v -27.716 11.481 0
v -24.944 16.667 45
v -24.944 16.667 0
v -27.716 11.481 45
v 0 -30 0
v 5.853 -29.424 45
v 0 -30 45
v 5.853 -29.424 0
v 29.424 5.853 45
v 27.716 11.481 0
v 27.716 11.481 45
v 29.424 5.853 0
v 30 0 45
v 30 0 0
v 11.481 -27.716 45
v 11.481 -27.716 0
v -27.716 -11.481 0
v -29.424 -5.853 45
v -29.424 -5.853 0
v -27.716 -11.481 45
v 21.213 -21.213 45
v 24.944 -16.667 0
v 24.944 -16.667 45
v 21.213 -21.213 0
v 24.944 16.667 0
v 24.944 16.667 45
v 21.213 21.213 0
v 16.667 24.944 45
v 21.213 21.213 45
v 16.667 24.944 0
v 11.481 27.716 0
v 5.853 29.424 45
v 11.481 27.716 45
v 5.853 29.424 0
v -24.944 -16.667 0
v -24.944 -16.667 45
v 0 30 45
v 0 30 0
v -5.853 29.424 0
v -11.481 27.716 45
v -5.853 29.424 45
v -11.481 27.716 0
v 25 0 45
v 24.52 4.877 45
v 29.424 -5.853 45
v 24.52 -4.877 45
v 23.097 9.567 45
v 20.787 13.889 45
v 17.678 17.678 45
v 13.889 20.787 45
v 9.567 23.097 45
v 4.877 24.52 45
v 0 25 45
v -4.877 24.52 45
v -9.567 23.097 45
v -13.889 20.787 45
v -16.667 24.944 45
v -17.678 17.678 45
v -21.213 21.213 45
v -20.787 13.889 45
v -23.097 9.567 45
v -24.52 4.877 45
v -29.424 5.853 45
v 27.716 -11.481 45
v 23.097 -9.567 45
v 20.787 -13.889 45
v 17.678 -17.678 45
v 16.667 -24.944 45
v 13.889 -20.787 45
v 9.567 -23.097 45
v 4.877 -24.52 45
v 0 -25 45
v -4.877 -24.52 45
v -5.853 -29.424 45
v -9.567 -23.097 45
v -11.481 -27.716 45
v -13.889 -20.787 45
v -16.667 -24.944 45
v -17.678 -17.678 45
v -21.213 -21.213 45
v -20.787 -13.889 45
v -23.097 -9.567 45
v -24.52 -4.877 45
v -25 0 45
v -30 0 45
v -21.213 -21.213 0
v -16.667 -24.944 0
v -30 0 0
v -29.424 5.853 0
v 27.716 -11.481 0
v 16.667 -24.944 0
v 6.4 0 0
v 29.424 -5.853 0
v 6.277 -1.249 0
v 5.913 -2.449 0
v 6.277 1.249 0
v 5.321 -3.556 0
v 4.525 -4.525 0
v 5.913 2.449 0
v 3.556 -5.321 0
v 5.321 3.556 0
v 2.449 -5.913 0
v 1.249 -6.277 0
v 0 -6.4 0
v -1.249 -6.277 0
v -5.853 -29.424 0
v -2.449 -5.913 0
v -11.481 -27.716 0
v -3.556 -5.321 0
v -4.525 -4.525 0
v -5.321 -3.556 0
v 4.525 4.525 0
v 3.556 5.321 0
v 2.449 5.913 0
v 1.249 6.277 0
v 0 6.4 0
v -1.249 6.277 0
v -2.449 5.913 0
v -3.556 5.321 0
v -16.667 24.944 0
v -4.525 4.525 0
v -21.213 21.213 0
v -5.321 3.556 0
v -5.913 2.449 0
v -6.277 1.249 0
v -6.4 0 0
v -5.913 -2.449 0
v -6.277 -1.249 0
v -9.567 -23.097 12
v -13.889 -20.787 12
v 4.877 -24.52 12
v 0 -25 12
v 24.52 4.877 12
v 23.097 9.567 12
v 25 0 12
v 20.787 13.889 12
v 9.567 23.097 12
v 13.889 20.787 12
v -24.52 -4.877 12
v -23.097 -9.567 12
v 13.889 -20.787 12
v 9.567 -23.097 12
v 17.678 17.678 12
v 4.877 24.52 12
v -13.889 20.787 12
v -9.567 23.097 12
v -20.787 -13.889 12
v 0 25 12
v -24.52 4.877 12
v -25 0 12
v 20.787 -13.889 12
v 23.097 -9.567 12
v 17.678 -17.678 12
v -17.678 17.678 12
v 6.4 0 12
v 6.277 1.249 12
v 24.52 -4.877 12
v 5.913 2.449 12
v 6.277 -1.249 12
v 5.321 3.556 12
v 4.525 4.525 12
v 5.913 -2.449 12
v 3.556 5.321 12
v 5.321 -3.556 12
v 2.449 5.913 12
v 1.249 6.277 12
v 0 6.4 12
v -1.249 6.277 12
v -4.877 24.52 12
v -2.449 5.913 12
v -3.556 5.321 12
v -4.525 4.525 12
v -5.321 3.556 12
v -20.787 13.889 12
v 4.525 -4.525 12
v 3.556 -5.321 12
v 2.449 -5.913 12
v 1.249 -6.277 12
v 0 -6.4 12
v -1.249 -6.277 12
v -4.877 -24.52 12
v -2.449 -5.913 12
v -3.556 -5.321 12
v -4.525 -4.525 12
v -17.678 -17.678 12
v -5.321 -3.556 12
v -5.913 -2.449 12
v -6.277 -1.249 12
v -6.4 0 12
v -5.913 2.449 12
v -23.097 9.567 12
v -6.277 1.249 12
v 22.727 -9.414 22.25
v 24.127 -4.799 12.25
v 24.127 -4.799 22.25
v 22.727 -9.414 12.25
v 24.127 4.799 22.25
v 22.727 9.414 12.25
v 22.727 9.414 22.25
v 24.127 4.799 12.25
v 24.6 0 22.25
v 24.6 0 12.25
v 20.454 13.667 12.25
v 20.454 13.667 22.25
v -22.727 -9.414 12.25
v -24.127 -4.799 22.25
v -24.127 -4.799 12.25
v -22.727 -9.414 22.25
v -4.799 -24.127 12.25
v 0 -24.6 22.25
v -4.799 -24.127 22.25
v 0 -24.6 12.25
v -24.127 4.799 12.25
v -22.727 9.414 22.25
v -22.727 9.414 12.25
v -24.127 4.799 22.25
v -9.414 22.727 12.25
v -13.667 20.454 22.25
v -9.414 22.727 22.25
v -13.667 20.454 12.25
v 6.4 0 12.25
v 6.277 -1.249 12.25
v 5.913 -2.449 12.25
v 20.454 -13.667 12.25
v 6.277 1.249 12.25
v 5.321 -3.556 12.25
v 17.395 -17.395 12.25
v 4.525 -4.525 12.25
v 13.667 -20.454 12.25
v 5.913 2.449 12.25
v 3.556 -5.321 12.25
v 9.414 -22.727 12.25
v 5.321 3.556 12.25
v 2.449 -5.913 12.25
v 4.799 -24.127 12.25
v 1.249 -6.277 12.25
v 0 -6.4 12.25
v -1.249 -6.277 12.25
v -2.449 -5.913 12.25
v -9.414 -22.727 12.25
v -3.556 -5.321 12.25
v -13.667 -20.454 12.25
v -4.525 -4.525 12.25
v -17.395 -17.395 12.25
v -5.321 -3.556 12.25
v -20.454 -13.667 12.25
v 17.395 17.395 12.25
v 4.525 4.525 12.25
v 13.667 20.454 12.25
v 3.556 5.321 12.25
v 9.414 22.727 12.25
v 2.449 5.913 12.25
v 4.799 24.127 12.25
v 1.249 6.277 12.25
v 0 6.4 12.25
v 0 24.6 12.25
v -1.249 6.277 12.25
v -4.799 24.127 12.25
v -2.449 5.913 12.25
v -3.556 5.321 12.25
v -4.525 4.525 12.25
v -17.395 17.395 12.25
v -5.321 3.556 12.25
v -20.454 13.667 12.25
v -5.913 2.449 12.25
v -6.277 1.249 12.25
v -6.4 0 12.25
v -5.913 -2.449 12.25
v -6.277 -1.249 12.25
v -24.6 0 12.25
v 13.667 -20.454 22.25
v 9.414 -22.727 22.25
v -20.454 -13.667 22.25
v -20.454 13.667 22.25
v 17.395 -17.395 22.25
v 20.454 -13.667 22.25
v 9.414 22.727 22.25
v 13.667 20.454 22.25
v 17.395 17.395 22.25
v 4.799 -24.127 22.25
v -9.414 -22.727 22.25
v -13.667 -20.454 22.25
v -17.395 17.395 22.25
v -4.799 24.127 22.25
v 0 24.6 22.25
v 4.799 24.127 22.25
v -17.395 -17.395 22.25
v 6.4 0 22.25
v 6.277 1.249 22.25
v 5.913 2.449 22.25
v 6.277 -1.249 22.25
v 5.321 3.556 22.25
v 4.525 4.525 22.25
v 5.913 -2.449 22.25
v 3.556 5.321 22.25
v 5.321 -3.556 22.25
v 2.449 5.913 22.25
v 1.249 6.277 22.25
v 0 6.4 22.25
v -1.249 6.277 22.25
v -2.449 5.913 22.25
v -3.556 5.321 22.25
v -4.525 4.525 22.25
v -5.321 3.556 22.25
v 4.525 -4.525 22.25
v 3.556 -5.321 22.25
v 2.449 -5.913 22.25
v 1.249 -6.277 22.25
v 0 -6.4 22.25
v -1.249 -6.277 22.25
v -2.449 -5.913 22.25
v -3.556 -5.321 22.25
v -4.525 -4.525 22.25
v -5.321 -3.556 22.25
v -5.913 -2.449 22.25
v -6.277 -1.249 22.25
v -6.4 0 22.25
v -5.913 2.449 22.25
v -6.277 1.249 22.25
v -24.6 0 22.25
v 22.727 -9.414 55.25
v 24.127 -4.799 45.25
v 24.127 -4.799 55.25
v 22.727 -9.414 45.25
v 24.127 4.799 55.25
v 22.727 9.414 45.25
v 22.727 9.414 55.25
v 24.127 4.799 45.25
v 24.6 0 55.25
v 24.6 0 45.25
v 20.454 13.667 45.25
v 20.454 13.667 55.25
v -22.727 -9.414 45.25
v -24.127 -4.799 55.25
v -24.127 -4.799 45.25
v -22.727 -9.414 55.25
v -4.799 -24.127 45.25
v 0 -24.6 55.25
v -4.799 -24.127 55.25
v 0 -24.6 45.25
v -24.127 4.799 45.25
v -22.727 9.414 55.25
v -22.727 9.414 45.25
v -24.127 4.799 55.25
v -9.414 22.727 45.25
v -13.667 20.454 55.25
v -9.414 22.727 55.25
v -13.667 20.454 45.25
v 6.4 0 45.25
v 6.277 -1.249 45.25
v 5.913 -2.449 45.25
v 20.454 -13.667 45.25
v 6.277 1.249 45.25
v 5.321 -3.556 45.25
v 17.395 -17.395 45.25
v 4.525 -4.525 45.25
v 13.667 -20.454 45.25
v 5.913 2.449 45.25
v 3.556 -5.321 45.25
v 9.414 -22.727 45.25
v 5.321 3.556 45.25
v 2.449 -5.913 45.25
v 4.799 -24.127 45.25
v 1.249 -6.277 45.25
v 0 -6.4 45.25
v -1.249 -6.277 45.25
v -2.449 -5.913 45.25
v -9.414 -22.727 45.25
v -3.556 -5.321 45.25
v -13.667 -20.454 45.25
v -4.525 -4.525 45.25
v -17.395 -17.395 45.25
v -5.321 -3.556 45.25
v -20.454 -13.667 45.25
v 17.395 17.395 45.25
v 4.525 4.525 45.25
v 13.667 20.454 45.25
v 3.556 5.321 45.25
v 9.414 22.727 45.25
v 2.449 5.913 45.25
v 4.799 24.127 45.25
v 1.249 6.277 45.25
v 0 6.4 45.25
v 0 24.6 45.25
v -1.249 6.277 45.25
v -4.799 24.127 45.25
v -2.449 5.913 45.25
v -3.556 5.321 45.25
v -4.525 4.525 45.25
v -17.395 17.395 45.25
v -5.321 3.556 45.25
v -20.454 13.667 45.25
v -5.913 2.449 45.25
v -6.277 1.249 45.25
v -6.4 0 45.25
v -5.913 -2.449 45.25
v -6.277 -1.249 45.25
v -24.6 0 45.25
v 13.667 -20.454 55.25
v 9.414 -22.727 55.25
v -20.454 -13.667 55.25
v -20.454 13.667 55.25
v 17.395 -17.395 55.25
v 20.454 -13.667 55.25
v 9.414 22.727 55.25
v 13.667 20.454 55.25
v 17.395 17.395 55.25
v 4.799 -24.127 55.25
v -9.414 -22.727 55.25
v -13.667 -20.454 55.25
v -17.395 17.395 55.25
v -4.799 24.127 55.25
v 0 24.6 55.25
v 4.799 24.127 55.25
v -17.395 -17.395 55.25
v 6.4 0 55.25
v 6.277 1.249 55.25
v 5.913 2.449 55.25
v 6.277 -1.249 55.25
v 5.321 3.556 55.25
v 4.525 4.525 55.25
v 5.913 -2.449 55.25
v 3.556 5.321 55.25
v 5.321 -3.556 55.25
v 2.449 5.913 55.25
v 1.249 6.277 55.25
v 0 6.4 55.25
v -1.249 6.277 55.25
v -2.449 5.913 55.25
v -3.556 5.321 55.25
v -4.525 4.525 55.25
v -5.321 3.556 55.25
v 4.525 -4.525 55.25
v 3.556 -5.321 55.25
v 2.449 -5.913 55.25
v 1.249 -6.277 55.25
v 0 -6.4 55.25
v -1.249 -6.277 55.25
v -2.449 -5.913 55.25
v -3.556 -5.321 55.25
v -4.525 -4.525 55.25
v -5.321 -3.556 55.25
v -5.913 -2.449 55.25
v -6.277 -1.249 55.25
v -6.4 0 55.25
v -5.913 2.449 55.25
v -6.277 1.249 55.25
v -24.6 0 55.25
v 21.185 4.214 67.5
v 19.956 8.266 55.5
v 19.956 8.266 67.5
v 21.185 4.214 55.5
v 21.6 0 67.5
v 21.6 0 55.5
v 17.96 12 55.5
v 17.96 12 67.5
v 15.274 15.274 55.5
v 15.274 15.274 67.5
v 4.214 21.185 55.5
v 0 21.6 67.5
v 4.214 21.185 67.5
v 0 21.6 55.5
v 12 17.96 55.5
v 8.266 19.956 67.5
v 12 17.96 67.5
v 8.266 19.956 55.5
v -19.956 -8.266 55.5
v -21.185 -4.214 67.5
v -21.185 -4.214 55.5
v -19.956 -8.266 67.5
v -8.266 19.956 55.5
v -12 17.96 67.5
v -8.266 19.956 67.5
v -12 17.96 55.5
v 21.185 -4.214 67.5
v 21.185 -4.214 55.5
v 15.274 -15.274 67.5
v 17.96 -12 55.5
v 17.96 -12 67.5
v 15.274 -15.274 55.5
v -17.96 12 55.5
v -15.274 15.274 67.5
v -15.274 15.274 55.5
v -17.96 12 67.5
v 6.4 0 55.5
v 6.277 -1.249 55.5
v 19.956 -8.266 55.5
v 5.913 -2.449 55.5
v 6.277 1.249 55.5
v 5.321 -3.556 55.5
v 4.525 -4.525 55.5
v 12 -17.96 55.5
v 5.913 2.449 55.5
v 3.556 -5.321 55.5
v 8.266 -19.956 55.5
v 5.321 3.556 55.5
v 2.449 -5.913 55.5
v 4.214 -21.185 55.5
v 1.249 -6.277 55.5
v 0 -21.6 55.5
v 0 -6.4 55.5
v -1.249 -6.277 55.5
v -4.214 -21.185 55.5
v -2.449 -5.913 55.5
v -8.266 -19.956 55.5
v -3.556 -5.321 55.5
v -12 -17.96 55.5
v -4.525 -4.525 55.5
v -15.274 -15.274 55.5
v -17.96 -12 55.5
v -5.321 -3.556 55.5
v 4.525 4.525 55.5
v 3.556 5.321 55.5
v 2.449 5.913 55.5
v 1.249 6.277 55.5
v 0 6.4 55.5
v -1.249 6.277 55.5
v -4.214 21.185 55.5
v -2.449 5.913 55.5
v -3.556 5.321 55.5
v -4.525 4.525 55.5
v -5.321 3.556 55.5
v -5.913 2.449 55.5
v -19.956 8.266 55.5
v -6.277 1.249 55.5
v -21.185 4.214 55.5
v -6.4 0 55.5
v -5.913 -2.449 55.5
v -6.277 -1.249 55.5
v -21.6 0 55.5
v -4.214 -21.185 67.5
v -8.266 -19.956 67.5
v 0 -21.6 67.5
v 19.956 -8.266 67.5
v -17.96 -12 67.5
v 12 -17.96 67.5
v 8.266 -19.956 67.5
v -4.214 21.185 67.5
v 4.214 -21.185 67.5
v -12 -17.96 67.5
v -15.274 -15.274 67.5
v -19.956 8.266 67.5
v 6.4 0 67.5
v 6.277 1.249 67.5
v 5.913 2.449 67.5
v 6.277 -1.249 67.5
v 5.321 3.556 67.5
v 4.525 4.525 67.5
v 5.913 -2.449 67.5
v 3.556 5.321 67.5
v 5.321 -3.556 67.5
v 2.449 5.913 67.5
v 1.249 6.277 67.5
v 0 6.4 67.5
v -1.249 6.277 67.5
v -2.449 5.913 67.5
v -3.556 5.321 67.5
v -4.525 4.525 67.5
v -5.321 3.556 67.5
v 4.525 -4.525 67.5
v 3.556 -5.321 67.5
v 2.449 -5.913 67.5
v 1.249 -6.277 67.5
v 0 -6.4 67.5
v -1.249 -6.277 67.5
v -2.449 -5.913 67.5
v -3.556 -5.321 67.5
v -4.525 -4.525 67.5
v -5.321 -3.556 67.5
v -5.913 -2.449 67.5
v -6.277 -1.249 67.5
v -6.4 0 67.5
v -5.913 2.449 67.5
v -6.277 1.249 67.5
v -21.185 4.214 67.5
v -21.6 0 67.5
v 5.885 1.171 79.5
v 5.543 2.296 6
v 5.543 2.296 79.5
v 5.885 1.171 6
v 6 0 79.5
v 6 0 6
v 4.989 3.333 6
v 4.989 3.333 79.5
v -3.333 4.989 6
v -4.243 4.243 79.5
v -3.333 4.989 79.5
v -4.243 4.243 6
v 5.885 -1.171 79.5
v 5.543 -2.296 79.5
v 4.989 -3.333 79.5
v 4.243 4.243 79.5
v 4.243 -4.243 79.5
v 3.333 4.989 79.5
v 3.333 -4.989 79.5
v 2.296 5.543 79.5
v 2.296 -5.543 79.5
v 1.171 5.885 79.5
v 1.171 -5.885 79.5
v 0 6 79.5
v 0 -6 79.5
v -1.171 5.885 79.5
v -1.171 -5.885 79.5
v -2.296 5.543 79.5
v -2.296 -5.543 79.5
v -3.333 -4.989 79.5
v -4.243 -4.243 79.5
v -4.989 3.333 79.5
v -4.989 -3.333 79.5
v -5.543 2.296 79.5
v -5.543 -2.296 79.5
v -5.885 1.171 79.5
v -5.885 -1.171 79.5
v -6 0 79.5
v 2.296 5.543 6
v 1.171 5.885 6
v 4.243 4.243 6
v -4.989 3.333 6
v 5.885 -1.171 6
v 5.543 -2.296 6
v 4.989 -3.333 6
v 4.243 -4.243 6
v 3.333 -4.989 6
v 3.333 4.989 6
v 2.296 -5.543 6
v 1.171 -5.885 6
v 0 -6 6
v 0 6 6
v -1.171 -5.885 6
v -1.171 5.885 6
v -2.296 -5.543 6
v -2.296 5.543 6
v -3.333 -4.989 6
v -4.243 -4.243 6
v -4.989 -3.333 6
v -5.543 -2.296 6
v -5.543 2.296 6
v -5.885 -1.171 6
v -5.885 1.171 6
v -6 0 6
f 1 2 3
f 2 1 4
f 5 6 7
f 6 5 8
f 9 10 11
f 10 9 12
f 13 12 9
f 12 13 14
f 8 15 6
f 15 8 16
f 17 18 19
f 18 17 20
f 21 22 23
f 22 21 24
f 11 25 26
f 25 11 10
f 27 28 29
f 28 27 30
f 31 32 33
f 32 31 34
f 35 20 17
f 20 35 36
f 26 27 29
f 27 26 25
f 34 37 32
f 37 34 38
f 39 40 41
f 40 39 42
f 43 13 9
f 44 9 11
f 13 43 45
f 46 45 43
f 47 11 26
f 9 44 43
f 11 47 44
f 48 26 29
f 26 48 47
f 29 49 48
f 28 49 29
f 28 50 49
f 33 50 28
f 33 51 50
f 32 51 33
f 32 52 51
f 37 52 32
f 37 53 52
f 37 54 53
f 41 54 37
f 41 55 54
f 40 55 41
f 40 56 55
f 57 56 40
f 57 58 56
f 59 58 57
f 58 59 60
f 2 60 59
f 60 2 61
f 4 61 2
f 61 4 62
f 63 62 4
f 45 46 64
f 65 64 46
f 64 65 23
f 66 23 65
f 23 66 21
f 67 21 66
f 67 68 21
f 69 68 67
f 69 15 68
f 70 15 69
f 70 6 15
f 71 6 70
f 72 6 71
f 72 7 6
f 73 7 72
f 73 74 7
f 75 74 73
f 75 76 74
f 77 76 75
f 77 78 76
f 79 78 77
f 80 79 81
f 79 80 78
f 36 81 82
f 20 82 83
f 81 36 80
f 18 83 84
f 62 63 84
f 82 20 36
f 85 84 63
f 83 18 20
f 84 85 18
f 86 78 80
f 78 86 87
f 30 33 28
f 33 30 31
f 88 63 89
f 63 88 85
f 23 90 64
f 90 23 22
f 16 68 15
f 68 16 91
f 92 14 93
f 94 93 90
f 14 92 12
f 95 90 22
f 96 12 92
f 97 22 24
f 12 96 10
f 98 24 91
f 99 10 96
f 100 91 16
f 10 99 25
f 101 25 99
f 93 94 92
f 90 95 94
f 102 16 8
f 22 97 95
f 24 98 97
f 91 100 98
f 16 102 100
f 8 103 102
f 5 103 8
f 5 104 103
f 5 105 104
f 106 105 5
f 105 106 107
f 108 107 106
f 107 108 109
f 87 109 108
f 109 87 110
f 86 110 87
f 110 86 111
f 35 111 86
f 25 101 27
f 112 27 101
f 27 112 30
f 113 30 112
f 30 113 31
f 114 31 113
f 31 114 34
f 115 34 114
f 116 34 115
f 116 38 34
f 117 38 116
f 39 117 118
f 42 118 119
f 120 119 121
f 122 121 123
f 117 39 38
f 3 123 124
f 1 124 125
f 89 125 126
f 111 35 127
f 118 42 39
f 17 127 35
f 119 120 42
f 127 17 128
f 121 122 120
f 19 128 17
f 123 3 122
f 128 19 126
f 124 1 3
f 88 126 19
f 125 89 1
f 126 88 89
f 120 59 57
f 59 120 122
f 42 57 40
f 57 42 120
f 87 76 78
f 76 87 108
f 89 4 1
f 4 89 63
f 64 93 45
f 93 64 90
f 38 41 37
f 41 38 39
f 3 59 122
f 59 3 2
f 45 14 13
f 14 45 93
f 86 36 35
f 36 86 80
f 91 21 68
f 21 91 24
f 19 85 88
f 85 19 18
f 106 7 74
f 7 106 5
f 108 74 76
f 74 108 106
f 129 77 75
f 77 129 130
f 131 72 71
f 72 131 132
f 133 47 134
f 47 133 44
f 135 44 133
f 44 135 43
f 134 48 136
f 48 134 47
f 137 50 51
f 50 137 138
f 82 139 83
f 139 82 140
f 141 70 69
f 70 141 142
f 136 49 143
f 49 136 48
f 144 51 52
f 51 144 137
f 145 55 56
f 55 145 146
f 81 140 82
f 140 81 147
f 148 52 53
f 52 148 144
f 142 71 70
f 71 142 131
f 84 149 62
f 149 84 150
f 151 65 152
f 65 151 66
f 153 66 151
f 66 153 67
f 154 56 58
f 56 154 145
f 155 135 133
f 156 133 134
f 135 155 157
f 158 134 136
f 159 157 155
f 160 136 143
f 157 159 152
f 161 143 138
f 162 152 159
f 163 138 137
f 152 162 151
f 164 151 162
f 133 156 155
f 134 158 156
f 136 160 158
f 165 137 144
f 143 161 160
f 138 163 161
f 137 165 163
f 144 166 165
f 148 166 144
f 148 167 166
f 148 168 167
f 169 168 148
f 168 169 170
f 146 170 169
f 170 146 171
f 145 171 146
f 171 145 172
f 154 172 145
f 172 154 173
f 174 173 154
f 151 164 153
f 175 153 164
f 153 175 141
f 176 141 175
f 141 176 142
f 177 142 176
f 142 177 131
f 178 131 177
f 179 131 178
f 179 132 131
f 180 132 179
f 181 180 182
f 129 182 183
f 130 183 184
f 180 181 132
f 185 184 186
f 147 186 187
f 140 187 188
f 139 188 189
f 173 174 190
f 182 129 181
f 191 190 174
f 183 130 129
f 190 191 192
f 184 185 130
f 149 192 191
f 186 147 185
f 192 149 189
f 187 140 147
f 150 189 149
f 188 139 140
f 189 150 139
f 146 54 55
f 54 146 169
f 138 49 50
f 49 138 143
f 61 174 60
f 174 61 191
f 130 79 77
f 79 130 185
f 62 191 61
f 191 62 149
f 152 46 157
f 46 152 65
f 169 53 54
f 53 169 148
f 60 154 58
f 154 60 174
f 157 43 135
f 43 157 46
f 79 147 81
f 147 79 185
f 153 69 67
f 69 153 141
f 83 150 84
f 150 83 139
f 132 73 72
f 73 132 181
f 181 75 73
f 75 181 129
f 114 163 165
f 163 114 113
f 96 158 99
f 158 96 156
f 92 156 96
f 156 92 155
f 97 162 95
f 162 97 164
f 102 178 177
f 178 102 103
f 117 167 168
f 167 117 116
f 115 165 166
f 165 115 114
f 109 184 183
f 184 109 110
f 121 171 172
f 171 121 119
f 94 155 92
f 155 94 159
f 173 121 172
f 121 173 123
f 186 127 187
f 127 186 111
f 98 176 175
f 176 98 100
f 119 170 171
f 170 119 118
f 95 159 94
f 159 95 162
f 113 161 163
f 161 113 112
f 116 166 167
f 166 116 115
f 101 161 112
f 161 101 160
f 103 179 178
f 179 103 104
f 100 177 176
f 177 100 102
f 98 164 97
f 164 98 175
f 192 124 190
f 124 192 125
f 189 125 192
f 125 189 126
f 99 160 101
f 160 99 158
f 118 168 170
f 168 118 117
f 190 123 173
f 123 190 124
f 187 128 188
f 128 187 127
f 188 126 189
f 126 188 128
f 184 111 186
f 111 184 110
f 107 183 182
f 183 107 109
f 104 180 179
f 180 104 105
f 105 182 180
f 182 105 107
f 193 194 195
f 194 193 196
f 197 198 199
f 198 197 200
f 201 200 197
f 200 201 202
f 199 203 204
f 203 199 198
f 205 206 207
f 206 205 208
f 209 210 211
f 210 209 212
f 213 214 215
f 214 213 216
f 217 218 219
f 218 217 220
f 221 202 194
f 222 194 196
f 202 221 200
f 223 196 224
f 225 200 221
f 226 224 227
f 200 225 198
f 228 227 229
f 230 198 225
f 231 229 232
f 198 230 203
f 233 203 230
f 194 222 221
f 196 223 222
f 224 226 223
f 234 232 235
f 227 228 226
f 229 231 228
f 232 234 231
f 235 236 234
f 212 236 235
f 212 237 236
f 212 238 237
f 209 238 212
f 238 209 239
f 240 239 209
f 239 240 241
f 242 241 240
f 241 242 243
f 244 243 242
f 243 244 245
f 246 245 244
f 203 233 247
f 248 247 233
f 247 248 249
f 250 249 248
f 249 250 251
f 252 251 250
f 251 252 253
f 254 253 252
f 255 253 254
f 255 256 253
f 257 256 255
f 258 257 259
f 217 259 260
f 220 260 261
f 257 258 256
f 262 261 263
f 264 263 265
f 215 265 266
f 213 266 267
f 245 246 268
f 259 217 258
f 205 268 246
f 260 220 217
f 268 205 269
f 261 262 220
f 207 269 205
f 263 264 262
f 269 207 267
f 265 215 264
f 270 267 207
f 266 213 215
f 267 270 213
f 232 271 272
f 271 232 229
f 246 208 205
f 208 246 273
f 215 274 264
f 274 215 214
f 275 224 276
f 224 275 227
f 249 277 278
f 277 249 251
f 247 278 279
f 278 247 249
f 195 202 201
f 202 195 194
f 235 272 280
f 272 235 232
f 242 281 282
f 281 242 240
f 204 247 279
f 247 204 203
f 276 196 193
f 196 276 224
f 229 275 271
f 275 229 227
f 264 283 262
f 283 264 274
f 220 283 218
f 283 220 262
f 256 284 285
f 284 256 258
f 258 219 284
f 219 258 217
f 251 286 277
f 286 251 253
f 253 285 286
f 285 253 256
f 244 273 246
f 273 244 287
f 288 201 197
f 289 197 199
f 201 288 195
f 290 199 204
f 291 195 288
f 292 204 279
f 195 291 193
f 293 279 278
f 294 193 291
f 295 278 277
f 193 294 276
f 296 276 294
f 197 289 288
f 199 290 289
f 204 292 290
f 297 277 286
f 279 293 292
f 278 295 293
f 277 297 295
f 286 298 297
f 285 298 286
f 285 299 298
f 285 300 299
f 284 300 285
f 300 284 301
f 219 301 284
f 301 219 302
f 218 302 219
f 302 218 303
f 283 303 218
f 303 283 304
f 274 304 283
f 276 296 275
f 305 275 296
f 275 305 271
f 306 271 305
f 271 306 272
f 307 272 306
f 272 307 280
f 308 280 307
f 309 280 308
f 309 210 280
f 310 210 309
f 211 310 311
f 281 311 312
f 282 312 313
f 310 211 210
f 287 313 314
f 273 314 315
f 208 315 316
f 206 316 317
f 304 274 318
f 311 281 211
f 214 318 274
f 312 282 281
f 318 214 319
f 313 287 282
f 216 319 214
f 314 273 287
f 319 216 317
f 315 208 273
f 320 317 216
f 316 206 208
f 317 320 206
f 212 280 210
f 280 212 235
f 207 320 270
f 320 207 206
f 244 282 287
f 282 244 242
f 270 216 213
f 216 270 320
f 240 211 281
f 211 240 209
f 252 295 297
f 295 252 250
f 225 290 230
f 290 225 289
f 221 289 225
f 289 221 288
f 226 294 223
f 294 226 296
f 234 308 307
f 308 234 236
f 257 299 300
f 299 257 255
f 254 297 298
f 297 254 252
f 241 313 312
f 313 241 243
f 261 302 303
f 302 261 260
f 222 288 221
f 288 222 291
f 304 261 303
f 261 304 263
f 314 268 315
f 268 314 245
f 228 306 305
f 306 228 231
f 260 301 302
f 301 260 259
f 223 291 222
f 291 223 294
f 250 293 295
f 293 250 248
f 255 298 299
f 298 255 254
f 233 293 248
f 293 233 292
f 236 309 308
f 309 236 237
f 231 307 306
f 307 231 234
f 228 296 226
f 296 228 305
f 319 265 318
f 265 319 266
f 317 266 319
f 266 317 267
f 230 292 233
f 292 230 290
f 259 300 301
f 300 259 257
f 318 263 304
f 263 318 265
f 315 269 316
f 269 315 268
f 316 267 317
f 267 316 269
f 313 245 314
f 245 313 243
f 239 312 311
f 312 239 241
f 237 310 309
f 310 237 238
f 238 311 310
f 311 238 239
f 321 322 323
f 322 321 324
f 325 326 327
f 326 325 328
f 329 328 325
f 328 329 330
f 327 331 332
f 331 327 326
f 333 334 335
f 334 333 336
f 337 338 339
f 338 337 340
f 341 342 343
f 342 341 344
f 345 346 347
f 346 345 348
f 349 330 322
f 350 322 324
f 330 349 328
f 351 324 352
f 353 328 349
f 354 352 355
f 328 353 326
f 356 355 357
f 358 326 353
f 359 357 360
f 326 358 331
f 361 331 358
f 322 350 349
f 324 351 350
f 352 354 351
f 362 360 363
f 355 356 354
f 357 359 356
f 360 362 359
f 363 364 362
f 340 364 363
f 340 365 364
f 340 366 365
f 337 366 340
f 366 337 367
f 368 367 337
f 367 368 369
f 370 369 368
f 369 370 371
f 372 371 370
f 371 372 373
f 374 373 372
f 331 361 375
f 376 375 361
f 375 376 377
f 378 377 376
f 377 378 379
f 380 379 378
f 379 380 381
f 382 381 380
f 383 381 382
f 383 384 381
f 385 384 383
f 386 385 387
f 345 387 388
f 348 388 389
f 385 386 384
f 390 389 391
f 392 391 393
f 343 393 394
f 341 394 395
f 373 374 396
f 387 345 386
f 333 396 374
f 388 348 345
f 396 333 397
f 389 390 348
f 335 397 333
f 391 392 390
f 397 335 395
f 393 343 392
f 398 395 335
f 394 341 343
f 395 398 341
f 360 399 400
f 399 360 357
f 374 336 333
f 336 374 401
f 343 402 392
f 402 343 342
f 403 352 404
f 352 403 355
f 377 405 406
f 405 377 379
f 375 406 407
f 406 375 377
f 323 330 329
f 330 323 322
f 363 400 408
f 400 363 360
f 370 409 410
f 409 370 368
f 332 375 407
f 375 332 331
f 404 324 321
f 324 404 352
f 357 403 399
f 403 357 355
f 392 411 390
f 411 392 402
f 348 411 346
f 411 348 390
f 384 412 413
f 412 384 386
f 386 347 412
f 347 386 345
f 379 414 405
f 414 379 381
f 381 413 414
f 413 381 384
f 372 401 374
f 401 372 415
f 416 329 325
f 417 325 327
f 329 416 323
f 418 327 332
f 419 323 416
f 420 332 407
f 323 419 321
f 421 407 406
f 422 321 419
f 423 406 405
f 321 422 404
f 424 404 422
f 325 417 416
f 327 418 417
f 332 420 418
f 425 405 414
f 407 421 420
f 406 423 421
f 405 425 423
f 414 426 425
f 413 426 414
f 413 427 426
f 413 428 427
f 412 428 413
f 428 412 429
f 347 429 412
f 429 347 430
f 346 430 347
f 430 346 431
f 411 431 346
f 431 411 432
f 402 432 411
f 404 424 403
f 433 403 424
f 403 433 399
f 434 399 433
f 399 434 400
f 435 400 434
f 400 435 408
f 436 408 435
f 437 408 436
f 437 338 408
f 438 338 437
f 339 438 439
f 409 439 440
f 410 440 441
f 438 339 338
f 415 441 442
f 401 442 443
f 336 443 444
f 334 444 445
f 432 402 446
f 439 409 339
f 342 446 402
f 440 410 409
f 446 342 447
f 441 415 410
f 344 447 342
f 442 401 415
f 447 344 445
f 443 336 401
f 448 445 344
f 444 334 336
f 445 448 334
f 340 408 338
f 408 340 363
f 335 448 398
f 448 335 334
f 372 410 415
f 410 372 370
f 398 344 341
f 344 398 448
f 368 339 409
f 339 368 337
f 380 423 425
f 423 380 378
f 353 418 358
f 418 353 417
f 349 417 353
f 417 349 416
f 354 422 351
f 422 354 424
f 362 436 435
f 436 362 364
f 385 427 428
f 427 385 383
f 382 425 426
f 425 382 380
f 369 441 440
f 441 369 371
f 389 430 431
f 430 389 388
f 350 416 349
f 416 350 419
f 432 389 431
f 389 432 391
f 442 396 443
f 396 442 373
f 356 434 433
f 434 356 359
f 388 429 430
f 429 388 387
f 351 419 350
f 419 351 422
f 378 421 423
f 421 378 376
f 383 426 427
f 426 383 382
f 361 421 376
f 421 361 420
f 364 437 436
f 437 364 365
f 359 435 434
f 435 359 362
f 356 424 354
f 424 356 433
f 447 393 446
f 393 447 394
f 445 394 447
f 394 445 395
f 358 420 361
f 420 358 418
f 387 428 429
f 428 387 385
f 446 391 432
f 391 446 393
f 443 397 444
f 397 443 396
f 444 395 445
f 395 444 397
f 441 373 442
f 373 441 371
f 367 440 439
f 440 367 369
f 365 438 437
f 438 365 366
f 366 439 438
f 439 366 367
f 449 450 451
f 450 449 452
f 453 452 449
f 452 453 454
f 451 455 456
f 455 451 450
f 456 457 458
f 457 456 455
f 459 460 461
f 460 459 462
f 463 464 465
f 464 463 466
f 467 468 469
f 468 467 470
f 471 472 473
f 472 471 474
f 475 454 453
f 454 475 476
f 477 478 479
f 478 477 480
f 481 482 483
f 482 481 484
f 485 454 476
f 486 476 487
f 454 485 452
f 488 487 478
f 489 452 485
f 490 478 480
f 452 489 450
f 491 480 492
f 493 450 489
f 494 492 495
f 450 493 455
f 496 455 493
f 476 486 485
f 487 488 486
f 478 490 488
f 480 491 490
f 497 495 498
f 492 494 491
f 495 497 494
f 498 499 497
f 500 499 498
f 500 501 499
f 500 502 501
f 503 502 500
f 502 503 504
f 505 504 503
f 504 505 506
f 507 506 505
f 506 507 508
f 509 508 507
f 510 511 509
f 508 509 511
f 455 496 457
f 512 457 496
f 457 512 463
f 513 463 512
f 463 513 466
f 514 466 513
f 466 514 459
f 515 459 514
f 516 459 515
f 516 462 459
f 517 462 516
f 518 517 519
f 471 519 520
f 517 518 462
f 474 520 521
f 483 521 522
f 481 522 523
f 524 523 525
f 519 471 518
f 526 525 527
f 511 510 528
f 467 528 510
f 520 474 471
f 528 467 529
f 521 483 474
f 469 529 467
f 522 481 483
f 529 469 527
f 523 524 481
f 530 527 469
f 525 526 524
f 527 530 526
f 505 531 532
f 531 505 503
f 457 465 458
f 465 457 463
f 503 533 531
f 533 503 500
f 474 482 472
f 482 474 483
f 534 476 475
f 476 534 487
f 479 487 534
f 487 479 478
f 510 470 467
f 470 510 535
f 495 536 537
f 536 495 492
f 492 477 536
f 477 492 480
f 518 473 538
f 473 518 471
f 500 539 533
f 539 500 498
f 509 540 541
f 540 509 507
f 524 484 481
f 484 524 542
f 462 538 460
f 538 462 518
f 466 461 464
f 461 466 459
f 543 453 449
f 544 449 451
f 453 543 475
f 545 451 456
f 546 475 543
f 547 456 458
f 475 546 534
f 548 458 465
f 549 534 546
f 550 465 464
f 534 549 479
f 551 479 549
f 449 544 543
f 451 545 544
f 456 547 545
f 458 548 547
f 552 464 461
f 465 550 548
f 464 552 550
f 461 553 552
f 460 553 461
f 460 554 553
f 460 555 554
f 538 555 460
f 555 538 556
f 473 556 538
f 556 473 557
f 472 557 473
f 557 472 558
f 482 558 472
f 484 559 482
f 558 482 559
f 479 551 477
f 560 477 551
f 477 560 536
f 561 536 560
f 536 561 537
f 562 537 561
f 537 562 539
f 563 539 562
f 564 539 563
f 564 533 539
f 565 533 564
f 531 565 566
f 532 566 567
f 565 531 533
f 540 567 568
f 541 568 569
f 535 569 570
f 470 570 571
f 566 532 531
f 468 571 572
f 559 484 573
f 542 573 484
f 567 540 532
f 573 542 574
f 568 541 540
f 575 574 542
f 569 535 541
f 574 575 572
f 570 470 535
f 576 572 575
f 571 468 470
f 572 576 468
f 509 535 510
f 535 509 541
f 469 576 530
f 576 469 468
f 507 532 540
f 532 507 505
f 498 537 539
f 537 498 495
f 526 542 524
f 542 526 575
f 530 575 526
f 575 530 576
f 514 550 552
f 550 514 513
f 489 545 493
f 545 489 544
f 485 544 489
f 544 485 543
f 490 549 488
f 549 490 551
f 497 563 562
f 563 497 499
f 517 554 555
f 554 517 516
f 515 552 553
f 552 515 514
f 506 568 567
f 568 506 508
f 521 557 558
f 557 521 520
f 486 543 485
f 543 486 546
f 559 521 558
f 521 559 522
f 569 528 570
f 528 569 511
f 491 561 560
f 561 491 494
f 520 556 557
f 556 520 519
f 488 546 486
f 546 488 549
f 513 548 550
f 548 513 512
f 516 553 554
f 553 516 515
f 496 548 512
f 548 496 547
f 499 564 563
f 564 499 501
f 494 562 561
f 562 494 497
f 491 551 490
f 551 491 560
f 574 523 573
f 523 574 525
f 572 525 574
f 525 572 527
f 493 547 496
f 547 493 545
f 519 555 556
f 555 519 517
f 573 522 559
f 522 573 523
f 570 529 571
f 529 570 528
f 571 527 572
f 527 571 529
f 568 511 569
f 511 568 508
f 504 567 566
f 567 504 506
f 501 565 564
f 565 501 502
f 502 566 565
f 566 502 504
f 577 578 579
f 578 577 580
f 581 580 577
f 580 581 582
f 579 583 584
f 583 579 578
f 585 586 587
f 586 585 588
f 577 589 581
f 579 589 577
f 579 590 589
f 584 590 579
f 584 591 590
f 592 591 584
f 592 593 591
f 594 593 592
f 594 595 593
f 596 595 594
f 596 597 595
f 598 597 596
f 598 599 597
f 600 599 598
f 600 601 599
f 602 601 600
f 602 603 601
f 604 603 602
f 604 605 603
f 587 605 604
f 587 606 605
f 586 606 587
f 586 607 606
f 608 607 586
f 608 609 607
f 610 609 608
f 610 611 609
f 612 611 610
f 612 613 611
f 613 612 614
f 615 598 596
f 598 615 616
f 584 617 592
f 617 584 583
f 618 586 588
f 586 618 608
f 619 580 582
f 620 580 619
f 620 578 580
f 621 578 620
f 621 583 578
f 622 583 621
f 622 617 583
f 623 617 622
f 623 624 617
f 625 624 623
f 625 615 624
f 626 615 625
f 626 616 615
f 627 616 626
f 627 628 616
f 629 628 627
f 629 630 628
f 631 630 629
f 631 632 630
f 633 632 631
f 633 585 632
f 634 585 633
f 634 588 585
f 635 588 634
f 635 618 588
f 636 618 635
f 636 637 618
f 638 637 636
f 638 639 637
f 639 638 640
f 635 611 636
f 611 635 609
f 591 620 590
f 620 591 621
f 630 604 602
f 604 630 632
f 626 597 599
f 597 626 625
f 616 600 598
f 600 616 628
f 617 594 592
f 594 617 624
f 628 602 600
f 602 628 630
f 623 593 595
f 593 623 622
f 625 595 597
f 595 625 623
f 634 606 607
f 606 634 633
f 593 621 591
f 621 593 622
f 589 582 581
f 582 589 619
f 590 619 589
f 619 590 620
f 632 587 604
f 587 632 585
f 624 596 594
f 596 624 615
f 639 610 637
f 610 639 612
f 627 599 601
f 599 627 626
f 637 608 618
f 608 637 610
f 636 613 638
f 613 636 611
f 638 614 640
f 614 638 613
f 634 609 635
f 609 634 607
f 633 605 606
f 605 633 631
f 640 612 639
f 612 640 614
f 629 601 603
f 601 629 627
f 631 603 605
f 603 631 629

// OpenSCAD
$fn = 32;

// ------------------------------------------------------------------------
// Bearing housing: housing d60, two bearings and a shaft
// Every part is its own module, assembly() places them once.
// ------------------------------------------------------------------------

// --- part 1 ---
module housing() {
  difference() {
    cylinder(h = 45, d = 60);
    translate([0, 0, 12]) cylinder(h = 34, d = 50);
    translate([0, 0, -1]) cylinder(h = 14, d = 12.8);
  }
}

// --- part 2 ---
module bearing_lower() {
  difference() {
      translate([0, 0, 0]) cylinder(h = 10, d = 49.2);
      translate([0, 0, -1]) cylinder(h = 12, d = 12.8);
    }
}

// --- part 3 ---
module bearing_upper() {
  difference() {
      translate([0, 0, 0]) cylinder(h = 10, d = 49.2);
      translate([0, 0, -1]) cylinder(h = 12, d = 12.8);
    }
}

// --- part 4 ---
module spacer() {
  difference() {
      translate([0, 0, 0]) cylinder(h = 12, d = 43.2);
      translate([0, 0, -1]) cylinder(h = 14, d = 12.8);
    }
}

// --- part 5 ---
module shaft() {
  translate([0, 0, -36.75]) cylinder(h = 73.5, d = 12);
}

// --- assembly ---
module assembly() {
  translate([0, 0, 0]) rotate([0, 0, 0]) housing();
  translate([0, 0, 12.25]) rotate([0, 0, 0]) bearing_lower();
  translate([0, 0, 45.25]) rotate([0, 0, 0]) bearing_upper();
  translate([0, 0, 55.5]) rotate([0, 0, 0]) spacer();
  translate([0, 0, 42.75]) rotate([0, 0, 0]) shaft();
}

assembly();
